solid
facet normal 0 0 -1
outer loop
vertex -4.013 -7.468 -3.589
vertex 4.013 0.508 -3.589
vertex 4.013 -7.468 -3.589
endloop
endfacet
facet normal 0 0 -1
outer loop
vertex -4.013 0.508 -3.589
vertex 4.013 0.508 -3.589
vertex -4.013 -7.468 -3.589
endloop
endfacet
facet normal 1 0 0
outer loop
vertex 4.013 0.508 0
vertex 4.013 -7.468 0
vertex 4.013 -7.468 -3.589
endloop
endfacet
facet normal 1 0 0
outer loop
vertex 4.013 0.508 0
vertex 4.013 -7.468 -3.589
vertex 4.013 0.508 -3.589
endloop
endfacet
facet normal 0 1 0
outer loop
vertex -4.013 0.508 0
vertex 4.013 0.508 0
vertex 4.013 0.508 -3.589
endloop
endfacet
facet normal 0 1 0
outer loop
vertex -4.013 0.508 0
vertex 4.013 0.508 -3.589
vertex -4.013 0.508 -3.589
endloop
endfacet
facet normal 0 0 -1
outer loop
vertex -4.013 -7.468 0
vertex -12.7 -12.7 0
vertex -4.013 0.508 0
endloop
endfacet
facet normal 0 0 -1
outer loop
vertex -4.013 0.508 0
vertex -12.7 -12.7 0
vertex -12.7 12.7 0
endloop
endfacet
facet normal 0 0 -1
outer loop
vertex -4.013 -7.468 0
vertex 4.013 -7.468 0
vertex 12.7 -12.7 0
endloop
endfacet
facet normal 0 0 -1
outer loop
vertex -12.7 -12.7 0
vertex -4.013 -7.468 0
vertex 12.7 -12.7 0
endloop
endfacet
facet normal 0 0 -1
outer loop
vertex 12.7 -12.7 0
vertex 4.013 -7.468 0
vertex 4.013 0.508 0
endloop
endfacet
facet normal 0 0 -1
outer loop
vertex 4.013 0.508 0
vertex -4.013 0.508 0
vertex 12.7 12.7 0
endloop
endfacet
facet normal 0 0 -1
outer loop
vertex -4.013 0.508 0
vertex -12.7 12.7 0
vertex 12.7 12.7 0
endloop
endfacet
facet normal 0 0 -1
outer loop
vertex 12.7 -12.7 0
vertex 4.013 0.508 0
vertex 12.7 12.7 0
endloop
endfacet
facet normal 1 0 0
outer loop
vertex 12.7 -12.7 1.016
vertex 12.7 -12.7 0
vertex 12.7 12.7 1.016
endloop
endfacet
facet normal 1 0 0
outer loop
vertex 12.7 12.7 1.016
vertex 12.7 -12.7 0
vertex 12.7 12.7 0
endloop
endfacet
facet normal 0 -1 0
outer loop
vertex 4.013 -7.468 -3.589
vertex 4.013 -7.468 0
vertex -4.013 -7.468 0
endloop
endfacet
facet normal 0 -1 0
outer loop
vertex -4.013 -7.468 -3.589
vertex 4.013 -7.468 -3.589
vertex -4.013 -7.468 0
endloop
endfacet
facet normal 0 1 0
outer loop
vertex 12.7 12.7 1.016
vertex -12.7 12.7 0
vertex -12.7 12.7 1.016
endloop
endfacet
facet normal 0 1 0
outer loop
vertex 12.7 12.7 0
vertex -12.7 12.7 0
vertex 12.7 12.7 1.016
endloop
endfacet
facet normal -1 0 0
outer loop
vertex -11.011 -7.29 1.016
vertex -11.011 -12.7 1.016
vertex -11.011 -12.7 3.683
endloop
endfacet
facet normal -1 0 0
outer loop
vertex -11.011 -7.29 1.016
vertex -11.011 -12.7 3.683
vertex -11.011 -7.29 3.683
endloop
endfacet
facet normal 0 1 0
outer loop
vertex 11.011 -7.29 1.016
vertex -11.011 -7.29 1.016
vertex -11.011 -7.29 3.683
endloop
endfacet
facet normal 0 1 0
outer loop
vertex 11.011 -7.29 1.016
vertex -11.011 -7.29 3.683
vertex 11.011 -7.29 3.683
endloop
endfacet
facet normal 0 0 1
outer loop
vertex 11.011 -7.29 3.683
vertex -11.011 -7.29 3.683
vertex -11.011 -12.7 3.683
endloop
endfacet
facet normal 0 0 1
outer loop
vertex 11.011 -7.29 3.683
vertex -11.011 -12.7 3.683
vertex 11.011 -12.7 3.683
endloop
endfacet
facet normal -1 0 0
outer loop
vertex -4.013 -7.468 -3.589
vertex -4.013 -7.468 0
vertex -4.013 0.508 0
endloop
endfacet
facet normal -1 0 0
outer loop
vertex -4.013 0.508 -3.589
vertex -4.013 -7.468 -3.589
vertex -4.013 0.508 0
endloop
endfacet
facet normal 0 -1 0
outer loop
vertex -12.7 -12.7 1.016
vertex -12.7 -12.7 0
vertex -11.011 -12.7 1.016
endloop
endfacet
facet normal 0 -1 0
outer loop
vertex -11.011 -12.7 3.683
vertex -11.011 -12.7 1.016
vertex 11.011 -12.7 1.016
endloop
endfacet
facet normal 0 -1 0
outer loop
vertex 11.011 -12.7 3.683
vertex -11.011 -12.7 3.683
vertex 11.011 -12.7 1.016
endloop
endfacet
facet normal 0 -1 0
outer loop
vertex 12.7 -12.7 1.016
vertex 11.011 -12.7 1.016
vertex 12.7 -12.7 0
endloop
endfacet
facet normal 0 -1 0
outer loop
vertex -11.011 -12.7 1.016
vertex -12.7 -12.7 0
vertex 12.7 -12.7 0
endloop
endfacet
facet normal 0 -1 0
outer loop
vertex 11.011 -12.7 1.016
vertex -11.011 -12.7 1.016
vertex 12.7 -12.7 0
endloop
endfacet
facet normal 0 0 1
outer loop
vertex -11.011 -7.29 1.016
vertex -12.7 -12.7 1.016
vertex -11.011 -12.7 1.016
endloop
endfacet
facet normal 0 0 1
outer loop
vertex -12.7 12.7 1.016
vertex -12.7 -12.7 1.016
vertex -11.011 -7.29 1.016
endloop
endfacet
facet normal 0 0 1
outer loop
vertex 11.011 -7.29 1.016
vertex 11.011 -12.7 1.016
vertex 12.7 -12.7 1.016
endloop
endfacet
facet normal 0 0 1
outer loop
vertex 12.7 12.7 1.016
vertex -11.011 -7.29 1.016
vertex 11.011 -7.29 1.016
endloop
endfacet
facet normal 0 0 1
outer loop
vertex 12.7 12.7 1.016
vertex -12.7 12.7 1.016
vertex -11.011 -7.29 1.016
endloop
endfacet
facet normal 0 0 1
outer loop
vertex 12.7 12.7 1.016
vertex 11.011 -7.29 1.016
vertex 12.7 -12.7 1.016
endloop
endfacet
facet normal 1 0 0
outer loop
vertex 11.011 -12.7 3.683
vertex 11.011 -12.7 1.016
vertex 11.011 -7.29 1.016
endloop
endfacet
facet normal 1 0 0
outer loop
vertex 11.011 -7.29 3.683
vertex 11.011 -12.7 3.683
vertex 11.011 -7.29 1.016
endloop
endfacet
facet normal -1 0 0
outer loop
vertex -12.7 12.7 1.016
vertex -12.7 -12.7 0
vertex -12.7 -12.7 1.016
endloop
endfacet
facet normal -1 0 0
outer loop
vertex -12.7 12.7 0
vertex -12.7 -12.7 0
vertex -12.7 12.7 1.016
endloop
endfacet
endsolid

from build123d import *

# Parameters (mm, degrees)
SKETCH1_W           = 25.4
SKETCH1_H           = 25.4
BOSS_EXTRUDE1_DEPTH = 1.016
SKETCH2_W           = 22.0218
SKETCH2_H           = 5.4102
BOSS_EXTRUDE2_DEPTH = 2.667
SKETCH3_W           = 8.0264
SKETCH3_H           = 7.9756
BOSS_EXTRUDE3_DEPTH = 3.58902


with BuildPart() as part:
    # Sketch1 → Boss-Extrude1 (new body)
    with BuildSketch(Plane.XY):
        Rectangle(SKETCH1_W, SKETCH1_H)
    extrude(amount=BOSS_EXTRUDE1_DEPTH)

    # Sketch2 → Boss-Extrude2 (add)
    with BuildSketch(Plane.XY.offset(1.016)):
        with Locations((0, -9.9949)):
            Rectangle(SKETCH2_W, SKETCH2_H)
    extrude(amount=BOSS_EXTRUDE2_DEPTH)

    # Sketch3 → Boss-Extrude3 (add)
    with BuildSketch(Plane(origin=(0, 0, 0), x_dir=(-1, 0, 0), z_dir=(0, 0, -1))):
        with Locations((0, -3.4798)):
            Rectangle(SKETCH3_W, SKETCH3_H)
    extrude(amount=BOSS_EXTRUDE3_DEPTH)


solid = part.part
